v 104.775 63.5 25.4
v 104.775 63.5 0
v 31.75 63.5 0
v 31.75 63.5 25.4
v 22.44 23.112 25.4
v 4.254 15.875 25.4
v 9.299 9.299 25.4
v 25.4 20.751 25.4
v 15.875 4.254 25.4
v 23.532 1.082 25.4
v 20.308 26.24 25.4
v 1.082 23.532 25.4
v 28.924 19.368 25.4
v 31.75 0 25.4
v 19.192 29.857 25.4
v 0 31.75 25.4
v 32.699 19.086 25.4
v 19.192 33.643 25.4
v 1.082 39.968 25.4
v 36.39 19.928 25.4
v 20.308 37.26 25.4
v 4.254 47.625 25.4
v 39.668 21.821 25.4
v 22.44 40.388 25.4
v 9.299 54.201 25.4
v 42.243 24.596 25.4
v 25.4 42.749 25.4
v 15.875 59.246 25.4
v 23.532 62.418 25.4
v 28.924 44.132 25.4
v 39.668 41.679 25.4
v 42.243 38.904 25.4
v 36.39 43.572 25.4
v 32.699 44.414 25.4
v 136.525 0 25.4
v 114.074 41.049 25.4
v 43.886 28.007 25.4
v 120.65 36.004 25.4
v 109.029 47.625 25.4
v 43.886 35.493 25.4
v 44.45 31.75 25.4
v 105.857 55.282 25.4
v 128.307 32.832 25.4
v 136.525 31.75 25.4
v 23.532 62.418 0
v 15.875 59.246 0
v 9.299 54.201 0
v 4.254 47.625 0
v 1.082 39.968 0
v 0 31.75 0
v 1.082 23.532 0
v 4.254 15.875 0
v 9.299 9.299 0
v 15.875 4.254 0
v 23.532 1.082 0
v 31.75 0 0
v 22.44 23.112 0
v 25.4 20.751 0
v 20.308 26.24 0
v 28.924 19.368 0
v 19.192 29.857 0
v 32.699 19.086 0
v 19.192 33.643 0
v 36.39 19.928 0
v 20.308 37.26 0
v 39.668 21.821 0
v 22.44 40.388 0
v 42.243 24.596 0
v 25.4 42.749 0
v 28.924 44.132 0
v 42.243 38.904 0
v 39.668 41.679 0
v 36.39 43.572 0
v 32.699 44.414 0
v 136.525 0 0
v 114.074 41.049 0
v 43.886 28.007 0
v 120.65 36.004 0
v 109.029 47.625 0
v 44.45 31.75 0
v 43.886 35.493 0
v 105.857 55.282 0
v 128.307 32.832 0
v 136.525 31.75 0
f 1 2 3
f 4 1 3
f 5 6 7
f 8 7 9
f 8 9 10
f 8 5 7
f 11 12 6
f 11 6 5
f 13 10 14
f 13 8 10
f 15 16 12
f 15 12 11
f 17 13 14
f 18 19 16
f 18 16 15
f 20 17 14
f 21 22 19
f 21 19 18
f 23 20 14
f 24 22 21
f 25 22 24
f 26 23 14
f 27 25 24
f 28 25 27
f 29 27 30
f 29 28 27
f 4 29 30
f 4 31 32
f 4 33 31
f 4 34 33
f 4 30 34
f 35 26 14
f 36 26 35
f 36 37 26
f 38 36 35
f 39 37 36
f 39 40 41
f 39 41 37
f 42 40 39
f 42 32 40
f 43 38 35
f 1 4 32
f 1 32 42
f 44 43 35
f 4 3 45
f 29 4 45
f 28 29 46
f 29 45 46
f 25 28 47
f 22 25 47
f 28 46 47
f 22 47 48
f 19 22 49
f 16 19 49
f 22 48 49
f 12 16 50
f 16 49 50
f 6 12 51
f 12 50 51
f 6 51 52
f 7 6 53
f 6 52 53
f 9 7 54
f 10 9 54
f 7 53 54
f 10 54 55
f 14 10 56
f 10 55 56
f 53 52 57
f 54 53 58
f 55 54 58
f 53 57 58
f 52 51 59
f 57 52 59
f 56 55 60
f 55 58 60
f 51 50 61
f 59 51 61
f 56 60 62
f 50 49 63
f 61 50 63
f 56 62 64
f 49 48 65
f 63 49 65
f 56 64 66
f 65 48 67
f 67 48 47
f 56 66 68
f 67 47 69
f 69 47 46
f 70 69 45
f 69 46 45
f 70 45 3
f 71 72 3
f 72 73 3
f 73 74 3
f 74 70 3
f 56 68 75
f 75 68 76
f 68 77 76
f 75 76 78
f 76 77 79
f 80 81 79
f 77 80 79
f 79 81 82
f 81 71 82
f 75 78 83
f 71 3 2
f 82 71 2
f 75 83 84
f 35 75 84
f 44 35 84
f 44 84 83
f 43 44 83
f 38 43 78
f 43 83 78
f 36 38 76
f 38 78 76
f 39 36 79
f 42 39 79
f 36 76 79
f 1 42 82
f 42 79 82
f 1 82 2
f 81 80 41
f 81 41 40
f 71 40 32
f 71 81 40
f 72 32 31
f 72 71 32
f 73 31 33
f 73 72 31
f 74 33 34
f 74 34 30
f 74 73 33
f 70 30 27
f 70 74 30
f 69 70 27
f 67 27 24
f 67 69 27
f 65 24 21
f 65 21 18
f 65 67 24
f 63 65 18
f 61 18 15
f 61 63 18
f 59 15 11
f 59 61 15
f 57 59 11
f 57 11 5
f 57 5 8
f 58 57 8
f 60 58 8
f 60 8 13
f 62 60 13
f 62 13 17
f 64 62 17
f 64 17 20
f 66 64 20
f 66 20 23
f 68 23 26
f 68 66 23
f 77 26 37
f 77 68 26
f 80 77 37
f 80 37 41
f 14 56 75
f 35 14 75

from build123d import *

# Parameters (mm, degrees)
F0_R     = 12.7
F1_DEPTH = 25.4


with BuildPart() as f1:
    # F0 (on Top) → F1 (new body)
    with BuildSketch(Plane.XY):
        with BuildLine():
            ThreePointArc((31.75, 63.5), (0, 31.75), (31.75, 0))
            Line((31.75, 0), (136.525, 0))
            Line((136.525, 0), (136.525, 31.75))
            ThreePointArc((136.525, 31.75), (114.07436, 41.04936), (104.775, 63.5))
            Line((104.775, 63.5), (31.75, 63.5))
        make_face()
        with Locations((31.75, 31.75)):
            Circle(F0_R, mode=Mode.SUBTRACT)
    extrude(amount=F1_DEPTH)


solid = f1.part
